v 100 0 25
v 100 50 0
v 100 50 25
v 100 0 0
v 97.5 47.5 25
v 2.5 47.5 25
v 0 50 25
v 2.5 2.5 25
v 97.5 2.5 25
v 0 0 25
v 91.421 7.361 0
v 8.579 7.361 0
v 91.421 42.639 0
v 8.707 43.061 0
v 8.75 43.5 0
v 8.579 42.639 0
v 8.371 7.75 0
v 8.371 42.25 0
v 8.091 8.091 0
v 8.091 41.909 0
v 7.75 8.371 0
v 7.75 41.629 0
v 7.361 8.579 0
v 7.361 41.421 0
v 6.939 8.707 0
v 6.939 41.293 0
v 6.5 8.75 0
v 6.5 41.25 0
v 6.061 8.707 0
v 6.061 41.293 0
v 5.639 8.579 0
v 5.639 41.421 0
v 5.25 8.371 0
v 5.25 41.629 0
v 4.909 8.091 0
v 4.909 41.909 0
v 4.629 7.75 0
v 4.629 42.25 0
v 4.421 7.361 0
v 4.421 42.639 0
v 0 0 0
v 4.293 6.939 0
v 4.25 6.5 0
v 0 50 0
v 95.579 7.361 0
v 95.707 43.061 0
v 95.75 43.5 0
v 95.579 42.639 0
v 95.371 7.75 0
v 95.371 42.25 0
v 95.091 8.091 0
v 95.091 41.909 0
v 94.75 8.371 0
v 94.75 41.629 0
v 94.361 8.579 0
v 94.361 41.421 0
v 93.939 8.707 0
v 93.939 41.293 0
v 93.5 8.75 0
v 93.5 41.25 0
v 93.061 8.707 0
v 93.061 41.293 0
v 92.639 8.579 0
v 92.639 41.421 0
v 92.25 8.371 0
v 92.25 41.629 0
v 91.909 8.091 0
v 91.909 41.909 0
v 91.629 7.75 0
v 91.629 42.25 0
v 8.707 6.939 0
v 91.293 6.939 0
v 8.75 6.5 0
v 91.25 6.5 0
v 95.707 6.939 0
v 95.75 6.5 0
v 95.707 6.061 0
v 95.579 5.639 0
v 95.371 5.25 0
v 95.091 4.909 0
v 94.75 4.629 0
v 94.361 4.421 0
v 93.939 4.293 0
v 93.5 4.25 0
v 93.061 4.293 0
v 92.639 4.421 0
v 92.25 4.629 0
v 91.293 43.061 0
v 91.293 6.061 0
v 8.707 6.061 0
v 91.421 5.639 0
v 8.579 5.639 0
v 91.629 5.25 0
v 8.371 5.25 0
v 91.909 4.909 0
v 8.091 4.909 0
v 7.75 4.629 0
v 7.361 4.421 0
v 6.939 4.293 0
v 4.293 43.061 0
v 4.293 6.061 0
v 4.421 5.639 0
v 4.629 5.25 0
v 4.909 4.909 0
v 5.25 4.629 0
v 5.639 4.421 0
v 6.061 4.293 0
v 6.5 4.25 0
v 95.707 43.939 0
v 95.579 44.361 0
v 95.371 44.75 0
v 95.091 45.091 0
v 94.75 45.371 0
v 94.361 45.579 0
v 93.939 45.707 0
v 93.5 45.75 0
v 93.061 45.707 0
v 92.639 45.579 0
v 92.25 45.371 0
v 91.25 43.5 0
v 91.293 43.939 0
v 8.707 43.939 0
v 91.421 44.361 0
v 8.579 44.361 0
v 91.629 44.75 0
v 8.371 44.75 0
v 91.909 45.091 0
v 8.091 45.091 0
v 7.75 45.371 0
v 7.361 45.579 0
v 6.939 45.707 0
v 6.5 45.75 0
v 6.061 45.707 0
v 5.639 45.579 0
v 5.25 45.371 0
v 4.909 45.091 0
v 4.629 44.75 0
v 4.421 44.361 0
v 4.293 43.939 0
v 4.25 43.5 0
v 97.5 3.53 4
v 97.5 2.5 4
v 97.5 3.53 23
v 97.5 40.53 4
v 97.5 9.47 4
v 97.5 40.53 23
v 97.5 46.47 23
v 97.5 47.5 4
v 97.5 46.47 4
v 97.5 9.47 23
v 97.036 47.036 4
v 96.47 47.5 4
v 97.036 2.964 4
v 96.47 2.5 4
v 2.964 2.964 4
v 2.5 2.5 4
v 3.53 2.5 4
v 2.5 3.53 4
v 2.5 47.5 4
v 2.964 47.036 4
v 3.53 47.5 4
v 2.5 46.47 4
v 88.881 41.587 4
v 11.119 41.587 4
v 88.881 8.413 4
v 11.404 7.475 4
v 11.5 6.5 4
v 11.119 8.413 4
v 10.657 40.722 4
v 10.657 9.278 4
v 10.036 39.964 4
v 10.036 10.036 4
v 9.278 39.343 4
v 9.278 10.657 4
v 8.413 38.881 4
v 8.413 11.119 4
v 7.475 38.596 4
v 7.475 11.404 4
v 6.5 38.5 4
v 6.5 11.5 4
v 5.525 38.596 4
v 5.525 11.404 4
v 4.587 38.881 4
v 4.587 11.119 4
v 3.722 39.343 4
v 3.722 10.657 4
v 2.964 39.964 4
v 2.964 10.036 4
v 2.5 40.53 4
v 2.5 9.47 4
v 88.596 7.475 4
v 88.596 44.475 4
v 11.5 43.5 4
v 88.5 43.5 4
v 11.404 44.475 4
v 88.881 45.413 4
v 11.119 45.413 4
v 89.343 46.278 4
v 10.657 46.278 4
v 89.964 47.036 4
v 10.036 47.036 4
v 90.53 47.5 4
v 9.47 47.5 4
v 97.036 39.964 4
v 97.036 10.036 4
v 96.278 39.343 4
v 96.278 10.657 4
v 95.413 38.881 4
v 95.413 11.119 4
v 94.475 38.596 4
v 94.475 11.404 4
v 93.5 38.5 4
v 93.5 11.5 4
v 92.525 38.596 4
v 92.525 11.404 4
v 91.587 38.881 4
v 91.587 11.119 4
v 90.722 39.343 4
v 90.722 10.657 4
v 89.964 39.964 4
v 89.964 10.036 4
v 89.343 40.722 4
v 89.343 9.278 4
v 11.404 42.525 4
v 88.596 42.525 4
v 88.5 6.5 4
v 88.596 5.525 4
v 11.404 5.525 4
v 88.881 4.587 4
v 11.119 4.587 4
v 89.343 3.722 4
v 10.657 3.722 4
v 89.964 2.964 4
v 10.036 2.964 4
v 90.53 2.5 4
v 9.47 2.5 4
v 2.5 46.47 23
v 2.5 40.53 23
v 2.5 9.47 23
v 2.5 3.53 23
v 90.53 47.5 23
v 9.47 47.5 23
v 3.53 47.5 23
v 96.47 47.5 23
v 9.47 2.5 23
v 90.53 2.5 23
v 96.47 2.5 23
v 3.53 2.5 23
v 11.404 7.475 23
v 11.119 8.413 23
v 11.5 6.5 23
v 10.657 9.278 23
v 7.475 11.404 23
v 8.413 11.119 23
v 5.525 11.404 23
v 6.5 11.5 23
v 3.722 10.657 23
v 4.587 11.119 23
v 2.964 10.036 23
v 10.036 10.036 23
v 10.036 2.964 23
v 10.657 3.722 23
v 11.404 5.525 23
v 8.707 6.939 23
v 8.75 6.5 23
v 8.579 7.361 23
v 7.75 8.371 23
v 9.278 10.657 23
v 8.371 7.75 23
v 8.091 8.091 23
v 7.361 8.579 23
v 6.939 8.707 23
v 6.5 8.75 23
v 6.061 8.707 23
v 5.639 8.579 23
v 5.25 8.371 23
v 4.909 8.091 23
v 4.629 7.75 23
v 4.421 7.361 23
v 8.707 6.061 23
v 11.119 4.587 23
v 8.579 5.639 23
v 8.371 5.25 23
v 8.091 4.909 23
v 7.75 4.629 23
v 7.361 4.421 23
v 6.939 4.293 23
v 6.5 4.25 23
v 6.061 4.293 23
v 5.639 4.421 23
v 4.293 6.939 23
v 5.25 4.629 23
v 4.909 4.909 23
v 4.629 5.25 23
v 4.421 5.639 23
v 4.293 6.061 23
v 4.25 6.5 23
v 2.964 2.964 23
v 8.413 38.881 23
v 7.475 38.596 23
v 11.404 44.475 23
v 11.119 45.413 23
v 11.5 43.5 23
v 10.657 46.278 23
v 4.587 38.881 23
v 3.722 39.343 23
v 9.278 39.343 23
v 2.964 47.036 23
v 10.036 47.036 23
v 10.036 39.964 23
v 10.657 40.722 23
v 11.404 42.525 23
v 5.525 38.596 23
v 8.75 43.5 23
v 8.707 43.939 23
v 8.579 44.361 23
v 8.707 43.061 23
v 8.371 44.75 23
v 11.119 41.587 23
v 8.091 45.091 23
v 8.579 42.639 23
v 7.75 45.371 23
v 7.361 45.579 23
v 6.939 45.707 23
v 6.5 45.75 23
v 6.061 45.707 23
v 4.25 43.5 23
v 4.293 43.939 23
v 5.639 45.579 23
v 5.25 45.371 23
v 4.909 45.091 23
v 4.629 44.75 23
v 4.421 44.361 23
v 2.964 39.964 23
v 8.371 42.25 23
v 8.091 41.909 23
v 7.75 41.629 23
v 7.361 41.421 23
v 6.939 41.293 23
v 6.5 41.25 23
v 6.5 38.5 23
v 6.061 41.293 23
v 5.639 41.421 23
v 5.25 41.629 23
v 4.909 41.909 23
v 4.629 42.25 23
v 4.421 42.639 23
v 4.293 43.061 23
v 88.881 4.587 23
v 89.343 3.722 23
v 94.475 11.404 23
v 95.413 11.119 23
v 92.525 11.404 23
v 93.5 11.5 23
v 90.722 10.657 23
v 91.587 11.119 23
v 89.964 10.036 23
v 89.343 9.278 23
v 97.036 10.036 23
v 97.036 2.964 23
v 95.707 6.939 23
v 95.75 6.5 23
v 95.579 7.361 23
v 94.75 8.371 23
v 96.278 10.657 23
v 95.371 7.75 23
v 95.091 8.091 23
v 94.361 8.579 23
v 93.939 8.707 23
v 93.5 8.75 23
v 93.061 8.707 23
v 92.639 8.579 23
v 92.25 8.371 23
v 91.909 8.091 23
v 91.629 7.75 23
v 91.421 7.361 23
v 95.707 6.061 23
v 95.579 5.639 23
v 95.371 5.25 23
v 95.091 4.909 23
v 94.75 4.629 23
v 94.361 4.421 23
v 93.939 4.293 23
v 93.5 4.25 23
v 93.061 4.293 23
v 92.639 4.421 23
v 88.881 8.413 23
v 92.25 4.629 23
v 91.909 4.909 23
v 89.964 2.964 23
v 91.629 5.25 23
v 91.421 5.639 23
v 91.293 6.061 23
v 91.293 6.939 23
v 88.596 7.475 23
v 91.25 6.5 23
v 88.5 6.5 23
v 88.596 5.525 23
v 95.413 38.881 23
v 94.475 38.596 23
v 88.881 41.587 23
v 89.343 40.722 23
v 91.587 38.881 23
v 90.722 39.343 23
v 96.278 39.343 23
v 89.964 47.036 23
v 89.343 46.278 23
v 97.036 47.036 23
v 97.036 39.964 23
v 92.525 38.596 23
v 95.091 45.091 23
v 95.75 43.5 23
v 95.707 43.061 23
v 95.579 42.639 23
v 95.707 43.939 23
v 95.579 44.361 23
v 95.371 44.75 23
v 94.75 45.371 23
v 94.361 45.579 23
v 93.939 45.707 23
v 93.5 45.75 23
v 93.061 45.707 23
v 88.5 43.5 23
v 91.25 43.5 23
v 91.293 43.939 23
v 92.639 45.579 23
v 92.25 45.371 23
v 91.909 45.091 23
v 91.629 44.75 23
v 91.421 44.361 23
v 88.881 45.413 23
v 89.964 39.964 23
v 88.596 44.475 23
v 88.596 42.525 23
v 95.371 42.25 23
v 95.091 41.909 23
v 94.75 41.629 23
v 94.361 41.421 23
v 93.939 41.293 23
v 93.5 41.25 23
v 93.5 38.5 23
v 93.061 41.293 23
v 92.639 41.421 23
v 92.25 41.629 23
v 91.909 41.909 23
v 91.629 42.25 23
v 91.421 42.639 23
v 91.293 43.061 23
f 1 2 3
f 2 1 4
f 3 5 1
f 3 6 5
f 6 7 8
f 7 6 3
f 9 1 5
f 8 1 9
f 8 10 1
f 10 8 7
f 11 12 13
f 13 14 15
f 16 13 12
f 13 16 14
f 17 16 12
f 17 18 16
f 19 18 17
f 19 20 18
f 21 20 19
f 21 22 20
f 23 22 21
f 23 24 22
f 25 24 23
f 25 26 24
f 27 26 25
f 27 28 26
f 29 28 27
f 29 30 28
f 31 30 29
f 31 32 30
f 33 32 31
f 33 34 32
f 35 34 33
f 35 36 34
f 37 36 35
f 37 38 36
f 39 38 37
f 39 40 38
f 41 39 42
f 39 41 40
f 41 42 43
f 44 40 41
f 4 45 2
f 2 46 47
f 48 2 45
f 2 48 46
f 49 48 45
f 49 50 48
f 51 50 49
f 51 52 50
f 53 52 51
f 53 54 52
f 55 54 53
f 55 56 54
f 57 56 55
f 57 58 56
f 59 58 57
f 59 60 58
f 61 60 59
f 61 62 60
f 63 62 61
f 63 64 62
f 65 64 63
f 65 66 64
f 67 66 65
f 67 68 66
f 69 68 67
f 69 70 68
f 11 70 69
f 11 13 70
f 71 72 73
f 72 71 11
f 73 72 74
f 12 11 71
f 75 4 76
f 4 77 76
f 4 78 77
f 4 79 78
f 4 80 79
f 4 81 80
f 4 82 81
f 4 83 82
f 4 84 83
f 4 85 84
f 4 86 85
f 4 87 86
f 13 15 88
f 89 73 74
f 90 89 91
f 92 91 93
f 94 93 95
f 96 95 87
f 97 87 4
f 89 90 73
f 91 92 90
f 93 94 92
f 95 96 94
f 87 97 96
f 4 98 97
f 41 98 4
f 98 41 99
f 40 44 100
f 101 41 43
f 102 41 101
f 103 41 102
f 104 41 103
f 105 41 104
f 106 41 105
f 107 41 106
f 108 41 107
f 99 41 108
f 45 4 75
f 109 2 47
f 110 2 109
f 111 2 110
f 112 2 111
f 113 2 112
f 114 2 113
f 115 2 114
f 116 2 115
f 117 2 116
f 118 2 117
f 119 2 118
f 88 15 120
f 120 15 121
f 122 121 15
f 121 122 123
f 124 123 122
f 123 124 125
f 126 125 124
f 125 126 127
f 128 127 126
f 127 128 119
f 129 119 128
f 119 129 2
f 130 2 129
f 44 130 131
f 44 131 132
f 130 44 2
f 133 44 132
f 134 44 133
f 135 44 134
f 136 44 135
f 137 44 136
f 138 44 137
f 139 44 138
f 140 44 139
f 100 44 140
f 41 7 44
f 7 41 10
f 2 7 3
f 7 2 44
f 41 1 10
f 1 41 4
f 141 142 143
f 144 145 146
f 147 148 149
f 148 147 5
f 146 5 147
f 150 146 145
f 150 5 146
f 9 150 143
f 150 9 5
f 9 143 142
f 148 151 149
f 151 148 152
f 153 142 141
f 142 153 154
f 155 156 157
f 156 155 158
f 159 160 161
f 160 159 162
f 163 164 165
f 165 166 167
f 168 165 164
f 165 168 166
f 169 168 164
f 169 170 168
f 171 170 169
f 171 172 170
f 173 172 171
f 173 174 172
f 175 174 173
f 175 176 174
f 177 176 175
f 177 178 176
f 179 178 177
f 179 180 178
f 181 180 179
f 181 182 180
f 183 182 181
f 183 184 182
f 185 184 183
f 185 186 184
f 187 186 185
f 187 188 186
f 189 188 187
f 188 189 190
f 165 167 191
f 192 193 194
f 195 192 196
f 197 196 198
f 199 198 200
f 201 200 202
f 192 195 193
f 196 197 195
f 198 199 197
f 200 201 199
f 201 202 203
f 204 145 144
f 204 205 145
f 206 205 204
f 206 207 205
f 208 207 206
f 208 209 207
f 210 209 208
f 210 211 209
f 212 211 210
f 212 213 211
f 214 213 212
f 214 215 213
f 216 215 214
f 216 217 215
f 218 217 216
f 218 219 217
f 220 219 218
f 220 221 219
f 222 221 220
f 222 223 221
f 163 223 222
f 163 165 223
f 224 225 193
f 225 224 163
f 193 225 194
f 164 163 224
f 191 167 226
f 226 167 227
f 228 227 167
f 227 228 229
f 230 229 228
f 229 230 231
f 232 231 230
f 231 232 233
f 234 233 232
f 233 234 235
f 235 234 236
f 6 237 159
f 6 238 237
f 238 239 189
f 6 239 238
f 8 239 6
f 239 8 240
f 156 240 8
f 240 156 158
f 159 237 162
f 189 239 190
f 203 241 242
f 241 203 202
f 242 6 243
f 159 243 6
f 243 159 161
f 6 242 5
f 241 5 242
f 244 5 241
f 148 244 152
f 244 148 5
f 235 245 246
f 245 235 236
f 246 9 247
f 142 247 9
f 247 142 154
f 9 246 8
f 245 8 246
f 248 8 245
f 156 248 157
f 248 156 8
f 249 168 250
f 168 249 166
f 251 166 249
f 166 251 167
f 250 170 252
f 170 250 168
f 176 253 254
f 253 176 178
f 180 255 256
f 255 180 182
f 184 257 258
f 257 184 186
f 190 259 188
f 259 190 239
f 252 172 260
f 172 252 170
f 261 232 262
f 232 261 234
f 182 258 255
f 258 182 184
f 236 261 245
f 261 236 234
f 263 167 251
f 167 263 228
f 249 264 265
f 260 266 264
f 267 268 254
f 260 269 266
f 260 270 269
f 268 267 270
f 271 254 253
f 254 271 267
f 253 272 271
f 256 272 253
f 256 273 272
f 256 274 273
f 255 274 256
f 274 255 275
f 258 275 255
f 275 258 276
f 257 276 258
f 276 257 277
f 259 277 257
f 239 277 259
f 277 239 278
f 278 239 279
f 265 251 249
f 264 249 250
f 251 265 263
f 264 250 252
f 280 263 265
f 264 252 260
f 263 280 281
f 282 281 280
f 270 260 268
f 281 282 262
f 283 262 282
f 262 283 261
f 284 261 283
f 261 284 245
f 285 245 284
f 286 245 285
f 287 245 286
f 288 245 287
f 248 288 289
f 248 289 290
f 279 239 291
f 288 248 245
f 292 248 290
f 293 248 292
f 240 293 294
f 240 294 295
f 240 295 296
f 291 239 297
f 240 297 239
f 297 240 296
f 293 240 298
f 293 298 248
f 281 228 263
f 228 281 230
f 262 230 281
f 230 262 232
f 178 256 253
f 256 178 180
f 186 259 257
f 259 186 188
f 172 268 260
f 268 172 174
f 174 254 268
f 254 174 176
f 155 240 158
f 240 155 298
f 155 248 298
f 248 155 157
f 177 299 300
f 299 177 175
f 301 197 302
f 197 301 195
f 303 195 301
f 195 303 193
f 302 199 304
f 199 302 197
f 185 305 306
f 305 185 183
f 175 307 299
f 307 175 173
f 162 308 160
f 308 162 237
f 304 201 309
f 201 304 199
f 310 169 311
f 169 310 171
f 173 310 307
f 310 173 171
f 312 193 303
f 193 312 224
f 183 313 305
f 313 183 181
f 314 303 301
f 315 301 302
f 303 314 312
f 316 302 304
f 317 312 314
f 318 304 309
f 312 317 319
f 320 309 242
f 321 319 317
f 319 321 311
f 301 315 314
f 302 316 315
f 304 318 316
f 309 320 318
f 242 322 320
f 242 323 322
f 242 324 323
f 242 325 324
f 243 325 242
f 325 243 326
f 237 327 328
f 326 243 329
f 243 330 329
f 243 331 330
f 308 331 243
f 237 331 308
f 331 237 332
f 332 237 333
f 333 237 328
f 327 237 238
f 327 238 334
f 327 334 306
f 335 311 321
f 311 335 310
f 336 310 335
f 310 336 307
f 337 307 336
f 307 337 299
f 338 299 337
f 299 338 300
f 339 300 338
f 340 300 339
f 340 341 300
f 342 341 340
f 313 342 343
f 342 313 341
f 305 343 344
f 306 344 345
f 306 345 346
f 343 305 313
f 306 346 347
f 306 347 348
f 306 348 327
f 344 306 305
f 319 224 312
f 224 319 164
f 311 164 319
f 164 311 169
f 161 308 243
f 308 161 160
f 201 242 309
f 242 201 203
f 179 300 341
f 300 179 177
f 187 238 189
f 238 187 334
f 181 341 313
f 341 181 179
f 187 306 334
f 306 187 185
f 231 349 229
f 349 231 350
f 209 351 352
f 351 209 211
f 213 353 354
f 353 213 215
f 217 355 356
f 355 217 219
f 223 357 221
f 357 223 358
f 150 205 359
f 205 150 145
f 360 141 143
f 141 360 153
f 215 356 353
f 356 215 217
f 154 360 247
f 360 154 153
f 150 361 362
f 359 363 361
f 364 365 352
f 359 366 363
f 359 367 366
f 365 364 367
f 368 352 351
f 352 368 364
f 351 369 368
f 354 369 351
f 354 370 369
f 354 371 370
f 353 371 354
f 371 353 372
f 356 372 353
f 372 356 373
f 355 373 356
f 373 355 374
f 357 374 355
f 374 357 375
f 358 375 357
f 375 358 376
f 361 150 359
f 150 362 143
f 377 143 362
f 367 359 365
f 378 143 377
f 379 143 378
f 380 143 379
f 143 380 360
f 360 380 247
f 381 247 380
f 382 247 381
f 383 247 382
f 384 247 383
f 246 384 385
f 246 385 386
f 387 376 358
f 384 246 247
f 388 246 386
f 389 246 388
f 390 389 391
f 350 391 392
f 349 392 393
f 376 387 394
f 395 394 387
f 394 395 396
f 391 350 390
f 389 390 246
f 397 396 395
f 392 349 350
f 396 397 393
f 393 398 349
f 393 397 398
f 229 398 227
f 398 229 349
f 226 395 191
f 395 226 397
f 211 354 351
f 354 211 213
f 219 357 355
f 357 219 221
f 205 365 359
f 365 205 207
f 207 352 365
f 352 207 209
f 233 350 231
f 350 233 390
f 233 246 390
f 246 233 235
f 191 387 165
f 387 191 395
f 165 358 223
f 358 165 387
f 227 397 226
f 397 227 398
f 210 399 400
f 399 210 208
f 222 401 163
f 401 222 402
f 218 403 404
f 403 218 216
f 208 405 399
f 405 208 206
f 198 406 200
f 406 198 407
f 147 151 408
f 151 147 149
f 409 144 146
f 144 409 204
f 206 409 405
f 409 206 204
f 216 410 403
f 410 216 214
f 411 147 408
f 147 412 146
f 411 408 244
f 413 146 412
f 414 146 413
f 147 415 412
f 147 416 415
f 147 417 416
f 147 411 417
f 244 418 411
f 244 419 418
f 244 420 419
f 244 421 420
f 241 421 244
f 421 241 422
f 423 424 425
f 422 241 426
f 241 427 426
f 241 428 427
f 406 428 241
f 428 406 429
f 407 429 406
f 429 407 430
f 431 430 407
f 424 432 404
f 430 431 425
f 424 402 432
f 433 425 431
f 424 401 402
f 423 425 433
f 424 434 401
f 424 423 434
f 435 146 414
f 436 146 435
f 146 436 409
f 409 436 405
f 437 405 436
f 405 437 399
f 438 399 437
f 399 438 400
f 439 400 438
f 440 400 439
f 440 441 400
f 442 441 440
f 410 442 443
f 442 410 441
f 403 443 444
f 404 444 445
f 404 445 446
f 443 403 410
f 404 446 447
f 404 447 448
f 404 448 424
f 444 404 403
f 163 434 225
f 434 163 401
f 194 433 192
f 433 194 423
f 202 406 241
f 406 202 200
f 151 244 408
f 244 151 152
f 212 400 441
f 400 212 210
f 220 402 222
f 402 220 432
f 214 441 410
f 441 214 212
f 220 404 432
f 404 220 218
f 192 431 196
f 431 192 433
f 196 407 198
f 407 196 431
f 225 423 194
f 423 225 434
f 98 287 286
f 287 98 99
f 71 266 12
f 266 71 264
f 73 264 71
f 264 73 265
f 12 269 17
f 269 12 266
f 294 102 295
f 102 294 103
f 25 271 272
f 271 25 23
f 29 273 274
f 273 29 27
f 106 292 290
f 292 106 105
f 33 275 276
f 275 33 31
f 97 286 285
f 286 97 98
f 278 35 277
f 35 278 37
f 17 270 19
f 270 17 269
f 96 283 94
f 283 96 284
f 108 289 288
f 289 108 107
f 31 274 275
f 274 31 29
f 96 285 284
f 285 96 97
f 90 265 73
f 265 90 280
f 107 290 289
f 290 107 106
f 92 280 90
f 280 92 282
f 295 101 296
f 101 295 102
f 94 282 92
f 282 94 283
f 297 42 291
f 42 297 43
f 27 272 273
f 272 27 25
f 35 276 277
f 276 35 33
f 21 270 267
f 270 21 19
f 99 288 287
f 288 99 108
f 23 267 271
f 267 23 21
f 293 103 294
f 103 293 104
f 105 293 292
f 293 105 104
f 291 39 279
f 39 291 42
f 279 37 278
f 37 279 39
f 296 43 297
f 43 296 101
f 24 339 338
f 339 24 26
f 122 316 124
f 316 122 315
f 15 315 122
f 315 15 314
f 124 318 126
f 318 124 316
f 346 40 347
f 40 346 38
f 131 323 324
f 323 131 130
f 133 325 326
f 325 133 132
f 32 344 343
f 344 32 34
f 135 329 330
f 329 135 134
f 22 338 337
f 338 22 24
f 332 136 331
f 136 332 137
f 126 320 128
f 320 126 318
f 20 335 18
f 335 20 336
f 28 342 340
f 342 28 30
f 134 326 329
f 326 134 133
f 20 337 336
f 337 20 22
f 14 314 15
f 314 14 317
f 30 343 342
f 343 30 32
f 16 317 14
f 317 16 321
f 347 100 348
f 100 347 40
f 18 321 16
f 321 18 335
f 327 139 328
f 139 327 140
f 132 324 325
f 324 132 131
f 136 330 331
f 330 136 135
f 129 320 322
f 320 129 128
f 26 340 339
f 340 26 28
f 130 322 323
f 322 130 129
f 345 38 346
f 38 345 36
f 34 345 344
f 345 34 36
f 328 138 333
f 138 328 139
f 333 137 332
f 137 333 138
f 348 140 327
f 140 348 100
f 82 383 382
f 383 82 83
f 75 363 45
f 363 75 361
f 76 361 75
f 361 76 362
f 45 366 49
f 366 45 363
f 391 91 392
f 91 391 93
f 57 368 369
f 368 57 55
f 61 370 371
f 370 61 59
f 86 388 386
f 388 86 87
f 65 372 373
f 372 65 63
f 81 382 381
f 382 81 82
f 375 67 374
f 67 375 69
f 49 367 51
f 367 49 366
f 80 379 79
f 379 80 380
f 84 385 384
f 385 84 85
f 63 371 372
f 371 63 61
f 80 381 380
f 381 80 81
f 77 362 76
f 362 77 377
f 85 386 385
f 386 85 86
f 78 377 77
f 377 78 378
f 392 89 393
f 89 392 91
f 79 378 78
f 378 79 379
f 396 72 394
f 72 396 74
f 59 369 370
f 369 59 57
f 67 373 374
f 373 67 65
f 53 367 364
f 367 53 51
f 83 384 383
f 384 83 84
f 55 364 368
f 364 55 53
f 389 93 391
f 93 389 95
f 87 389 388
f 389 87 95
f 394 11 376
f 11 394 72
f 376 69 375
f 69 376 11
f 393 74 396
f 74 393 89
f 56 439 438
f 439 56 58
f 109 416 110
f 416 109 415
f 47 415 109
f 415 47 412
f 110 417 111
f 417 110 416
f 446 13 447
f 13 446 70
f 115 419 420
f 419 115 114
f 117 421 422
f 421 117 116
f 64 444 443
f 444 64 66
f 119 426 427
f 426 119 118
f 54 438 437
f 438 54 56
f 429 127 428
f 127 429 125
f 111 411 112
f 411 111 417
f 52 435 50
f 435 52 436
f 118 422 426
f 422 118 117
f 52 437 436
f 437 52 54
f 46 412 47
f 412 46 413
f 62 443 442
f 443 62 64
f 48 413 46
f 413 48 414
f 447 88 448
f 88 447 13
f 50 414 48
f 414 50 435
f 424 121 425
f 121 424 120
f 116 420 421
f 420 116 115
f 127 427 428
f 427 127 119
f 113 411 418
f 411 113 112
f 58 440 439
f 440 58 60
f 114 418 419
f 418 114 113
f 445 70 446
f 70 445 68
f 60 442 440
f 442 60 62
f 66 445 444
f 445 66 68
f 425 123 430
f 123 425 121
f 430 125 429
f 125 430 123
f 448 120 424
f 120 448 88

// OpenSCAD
$fn = 32;

// ----------------------------------------------------------------------
// Enclosure body: 100 x 50 x 25 mm, wall 2.5 mm
// ----------------------------------------------------------------------

// --- parameters (mm) ---
length = 100;             // outside length, X
width = 50;               // outside width, Y
height = 25;              // outside height, Z
wall = 2.5;               // side wall thickness
floor_t = 4;              // floor thickness
boss_d = 10;              // corner boss diameter
boss_h = 19;              // corner boss height above the floor
boss_hole_d = 4.5;        // lid screw clearance in the boss
boss_lip = 6.5;           // boss centre inset from the corner

module shell() {
  difference() {
    cube([length, width, height]);
    /* hollow, open at the top */
    translate([wall, wall, floor_t])
      cube([length - 2 * wall, width - 2 * wall, height]);
  }
}

module bosses() {
  /* corner bosses, sunk 1 mm into the floor */
  for (sx = [0, 1]) for (sy = [0, 1])
    translate([sx * (length - 2 * boss_lip) + boss_lip, sy * (width - 2 * boss_lip) + boss_lip, floor_t - 1])
      cylinder(h = boss_h + 1, d = boss_d);
}

difference() {
  union() {
    shell();
    bosses();
  }
  /* boss screw holes */
  for (sx = [0, 1]) for (sy = [0, 1])
    translate([sx * (length - 2 * boss_lip) + boss_lip, sy * (width - 2 * boss_lip) + boss_lip, -1]) cylinder(h = floor_t + boss_h + 2, d = boss_hole_d);
}
